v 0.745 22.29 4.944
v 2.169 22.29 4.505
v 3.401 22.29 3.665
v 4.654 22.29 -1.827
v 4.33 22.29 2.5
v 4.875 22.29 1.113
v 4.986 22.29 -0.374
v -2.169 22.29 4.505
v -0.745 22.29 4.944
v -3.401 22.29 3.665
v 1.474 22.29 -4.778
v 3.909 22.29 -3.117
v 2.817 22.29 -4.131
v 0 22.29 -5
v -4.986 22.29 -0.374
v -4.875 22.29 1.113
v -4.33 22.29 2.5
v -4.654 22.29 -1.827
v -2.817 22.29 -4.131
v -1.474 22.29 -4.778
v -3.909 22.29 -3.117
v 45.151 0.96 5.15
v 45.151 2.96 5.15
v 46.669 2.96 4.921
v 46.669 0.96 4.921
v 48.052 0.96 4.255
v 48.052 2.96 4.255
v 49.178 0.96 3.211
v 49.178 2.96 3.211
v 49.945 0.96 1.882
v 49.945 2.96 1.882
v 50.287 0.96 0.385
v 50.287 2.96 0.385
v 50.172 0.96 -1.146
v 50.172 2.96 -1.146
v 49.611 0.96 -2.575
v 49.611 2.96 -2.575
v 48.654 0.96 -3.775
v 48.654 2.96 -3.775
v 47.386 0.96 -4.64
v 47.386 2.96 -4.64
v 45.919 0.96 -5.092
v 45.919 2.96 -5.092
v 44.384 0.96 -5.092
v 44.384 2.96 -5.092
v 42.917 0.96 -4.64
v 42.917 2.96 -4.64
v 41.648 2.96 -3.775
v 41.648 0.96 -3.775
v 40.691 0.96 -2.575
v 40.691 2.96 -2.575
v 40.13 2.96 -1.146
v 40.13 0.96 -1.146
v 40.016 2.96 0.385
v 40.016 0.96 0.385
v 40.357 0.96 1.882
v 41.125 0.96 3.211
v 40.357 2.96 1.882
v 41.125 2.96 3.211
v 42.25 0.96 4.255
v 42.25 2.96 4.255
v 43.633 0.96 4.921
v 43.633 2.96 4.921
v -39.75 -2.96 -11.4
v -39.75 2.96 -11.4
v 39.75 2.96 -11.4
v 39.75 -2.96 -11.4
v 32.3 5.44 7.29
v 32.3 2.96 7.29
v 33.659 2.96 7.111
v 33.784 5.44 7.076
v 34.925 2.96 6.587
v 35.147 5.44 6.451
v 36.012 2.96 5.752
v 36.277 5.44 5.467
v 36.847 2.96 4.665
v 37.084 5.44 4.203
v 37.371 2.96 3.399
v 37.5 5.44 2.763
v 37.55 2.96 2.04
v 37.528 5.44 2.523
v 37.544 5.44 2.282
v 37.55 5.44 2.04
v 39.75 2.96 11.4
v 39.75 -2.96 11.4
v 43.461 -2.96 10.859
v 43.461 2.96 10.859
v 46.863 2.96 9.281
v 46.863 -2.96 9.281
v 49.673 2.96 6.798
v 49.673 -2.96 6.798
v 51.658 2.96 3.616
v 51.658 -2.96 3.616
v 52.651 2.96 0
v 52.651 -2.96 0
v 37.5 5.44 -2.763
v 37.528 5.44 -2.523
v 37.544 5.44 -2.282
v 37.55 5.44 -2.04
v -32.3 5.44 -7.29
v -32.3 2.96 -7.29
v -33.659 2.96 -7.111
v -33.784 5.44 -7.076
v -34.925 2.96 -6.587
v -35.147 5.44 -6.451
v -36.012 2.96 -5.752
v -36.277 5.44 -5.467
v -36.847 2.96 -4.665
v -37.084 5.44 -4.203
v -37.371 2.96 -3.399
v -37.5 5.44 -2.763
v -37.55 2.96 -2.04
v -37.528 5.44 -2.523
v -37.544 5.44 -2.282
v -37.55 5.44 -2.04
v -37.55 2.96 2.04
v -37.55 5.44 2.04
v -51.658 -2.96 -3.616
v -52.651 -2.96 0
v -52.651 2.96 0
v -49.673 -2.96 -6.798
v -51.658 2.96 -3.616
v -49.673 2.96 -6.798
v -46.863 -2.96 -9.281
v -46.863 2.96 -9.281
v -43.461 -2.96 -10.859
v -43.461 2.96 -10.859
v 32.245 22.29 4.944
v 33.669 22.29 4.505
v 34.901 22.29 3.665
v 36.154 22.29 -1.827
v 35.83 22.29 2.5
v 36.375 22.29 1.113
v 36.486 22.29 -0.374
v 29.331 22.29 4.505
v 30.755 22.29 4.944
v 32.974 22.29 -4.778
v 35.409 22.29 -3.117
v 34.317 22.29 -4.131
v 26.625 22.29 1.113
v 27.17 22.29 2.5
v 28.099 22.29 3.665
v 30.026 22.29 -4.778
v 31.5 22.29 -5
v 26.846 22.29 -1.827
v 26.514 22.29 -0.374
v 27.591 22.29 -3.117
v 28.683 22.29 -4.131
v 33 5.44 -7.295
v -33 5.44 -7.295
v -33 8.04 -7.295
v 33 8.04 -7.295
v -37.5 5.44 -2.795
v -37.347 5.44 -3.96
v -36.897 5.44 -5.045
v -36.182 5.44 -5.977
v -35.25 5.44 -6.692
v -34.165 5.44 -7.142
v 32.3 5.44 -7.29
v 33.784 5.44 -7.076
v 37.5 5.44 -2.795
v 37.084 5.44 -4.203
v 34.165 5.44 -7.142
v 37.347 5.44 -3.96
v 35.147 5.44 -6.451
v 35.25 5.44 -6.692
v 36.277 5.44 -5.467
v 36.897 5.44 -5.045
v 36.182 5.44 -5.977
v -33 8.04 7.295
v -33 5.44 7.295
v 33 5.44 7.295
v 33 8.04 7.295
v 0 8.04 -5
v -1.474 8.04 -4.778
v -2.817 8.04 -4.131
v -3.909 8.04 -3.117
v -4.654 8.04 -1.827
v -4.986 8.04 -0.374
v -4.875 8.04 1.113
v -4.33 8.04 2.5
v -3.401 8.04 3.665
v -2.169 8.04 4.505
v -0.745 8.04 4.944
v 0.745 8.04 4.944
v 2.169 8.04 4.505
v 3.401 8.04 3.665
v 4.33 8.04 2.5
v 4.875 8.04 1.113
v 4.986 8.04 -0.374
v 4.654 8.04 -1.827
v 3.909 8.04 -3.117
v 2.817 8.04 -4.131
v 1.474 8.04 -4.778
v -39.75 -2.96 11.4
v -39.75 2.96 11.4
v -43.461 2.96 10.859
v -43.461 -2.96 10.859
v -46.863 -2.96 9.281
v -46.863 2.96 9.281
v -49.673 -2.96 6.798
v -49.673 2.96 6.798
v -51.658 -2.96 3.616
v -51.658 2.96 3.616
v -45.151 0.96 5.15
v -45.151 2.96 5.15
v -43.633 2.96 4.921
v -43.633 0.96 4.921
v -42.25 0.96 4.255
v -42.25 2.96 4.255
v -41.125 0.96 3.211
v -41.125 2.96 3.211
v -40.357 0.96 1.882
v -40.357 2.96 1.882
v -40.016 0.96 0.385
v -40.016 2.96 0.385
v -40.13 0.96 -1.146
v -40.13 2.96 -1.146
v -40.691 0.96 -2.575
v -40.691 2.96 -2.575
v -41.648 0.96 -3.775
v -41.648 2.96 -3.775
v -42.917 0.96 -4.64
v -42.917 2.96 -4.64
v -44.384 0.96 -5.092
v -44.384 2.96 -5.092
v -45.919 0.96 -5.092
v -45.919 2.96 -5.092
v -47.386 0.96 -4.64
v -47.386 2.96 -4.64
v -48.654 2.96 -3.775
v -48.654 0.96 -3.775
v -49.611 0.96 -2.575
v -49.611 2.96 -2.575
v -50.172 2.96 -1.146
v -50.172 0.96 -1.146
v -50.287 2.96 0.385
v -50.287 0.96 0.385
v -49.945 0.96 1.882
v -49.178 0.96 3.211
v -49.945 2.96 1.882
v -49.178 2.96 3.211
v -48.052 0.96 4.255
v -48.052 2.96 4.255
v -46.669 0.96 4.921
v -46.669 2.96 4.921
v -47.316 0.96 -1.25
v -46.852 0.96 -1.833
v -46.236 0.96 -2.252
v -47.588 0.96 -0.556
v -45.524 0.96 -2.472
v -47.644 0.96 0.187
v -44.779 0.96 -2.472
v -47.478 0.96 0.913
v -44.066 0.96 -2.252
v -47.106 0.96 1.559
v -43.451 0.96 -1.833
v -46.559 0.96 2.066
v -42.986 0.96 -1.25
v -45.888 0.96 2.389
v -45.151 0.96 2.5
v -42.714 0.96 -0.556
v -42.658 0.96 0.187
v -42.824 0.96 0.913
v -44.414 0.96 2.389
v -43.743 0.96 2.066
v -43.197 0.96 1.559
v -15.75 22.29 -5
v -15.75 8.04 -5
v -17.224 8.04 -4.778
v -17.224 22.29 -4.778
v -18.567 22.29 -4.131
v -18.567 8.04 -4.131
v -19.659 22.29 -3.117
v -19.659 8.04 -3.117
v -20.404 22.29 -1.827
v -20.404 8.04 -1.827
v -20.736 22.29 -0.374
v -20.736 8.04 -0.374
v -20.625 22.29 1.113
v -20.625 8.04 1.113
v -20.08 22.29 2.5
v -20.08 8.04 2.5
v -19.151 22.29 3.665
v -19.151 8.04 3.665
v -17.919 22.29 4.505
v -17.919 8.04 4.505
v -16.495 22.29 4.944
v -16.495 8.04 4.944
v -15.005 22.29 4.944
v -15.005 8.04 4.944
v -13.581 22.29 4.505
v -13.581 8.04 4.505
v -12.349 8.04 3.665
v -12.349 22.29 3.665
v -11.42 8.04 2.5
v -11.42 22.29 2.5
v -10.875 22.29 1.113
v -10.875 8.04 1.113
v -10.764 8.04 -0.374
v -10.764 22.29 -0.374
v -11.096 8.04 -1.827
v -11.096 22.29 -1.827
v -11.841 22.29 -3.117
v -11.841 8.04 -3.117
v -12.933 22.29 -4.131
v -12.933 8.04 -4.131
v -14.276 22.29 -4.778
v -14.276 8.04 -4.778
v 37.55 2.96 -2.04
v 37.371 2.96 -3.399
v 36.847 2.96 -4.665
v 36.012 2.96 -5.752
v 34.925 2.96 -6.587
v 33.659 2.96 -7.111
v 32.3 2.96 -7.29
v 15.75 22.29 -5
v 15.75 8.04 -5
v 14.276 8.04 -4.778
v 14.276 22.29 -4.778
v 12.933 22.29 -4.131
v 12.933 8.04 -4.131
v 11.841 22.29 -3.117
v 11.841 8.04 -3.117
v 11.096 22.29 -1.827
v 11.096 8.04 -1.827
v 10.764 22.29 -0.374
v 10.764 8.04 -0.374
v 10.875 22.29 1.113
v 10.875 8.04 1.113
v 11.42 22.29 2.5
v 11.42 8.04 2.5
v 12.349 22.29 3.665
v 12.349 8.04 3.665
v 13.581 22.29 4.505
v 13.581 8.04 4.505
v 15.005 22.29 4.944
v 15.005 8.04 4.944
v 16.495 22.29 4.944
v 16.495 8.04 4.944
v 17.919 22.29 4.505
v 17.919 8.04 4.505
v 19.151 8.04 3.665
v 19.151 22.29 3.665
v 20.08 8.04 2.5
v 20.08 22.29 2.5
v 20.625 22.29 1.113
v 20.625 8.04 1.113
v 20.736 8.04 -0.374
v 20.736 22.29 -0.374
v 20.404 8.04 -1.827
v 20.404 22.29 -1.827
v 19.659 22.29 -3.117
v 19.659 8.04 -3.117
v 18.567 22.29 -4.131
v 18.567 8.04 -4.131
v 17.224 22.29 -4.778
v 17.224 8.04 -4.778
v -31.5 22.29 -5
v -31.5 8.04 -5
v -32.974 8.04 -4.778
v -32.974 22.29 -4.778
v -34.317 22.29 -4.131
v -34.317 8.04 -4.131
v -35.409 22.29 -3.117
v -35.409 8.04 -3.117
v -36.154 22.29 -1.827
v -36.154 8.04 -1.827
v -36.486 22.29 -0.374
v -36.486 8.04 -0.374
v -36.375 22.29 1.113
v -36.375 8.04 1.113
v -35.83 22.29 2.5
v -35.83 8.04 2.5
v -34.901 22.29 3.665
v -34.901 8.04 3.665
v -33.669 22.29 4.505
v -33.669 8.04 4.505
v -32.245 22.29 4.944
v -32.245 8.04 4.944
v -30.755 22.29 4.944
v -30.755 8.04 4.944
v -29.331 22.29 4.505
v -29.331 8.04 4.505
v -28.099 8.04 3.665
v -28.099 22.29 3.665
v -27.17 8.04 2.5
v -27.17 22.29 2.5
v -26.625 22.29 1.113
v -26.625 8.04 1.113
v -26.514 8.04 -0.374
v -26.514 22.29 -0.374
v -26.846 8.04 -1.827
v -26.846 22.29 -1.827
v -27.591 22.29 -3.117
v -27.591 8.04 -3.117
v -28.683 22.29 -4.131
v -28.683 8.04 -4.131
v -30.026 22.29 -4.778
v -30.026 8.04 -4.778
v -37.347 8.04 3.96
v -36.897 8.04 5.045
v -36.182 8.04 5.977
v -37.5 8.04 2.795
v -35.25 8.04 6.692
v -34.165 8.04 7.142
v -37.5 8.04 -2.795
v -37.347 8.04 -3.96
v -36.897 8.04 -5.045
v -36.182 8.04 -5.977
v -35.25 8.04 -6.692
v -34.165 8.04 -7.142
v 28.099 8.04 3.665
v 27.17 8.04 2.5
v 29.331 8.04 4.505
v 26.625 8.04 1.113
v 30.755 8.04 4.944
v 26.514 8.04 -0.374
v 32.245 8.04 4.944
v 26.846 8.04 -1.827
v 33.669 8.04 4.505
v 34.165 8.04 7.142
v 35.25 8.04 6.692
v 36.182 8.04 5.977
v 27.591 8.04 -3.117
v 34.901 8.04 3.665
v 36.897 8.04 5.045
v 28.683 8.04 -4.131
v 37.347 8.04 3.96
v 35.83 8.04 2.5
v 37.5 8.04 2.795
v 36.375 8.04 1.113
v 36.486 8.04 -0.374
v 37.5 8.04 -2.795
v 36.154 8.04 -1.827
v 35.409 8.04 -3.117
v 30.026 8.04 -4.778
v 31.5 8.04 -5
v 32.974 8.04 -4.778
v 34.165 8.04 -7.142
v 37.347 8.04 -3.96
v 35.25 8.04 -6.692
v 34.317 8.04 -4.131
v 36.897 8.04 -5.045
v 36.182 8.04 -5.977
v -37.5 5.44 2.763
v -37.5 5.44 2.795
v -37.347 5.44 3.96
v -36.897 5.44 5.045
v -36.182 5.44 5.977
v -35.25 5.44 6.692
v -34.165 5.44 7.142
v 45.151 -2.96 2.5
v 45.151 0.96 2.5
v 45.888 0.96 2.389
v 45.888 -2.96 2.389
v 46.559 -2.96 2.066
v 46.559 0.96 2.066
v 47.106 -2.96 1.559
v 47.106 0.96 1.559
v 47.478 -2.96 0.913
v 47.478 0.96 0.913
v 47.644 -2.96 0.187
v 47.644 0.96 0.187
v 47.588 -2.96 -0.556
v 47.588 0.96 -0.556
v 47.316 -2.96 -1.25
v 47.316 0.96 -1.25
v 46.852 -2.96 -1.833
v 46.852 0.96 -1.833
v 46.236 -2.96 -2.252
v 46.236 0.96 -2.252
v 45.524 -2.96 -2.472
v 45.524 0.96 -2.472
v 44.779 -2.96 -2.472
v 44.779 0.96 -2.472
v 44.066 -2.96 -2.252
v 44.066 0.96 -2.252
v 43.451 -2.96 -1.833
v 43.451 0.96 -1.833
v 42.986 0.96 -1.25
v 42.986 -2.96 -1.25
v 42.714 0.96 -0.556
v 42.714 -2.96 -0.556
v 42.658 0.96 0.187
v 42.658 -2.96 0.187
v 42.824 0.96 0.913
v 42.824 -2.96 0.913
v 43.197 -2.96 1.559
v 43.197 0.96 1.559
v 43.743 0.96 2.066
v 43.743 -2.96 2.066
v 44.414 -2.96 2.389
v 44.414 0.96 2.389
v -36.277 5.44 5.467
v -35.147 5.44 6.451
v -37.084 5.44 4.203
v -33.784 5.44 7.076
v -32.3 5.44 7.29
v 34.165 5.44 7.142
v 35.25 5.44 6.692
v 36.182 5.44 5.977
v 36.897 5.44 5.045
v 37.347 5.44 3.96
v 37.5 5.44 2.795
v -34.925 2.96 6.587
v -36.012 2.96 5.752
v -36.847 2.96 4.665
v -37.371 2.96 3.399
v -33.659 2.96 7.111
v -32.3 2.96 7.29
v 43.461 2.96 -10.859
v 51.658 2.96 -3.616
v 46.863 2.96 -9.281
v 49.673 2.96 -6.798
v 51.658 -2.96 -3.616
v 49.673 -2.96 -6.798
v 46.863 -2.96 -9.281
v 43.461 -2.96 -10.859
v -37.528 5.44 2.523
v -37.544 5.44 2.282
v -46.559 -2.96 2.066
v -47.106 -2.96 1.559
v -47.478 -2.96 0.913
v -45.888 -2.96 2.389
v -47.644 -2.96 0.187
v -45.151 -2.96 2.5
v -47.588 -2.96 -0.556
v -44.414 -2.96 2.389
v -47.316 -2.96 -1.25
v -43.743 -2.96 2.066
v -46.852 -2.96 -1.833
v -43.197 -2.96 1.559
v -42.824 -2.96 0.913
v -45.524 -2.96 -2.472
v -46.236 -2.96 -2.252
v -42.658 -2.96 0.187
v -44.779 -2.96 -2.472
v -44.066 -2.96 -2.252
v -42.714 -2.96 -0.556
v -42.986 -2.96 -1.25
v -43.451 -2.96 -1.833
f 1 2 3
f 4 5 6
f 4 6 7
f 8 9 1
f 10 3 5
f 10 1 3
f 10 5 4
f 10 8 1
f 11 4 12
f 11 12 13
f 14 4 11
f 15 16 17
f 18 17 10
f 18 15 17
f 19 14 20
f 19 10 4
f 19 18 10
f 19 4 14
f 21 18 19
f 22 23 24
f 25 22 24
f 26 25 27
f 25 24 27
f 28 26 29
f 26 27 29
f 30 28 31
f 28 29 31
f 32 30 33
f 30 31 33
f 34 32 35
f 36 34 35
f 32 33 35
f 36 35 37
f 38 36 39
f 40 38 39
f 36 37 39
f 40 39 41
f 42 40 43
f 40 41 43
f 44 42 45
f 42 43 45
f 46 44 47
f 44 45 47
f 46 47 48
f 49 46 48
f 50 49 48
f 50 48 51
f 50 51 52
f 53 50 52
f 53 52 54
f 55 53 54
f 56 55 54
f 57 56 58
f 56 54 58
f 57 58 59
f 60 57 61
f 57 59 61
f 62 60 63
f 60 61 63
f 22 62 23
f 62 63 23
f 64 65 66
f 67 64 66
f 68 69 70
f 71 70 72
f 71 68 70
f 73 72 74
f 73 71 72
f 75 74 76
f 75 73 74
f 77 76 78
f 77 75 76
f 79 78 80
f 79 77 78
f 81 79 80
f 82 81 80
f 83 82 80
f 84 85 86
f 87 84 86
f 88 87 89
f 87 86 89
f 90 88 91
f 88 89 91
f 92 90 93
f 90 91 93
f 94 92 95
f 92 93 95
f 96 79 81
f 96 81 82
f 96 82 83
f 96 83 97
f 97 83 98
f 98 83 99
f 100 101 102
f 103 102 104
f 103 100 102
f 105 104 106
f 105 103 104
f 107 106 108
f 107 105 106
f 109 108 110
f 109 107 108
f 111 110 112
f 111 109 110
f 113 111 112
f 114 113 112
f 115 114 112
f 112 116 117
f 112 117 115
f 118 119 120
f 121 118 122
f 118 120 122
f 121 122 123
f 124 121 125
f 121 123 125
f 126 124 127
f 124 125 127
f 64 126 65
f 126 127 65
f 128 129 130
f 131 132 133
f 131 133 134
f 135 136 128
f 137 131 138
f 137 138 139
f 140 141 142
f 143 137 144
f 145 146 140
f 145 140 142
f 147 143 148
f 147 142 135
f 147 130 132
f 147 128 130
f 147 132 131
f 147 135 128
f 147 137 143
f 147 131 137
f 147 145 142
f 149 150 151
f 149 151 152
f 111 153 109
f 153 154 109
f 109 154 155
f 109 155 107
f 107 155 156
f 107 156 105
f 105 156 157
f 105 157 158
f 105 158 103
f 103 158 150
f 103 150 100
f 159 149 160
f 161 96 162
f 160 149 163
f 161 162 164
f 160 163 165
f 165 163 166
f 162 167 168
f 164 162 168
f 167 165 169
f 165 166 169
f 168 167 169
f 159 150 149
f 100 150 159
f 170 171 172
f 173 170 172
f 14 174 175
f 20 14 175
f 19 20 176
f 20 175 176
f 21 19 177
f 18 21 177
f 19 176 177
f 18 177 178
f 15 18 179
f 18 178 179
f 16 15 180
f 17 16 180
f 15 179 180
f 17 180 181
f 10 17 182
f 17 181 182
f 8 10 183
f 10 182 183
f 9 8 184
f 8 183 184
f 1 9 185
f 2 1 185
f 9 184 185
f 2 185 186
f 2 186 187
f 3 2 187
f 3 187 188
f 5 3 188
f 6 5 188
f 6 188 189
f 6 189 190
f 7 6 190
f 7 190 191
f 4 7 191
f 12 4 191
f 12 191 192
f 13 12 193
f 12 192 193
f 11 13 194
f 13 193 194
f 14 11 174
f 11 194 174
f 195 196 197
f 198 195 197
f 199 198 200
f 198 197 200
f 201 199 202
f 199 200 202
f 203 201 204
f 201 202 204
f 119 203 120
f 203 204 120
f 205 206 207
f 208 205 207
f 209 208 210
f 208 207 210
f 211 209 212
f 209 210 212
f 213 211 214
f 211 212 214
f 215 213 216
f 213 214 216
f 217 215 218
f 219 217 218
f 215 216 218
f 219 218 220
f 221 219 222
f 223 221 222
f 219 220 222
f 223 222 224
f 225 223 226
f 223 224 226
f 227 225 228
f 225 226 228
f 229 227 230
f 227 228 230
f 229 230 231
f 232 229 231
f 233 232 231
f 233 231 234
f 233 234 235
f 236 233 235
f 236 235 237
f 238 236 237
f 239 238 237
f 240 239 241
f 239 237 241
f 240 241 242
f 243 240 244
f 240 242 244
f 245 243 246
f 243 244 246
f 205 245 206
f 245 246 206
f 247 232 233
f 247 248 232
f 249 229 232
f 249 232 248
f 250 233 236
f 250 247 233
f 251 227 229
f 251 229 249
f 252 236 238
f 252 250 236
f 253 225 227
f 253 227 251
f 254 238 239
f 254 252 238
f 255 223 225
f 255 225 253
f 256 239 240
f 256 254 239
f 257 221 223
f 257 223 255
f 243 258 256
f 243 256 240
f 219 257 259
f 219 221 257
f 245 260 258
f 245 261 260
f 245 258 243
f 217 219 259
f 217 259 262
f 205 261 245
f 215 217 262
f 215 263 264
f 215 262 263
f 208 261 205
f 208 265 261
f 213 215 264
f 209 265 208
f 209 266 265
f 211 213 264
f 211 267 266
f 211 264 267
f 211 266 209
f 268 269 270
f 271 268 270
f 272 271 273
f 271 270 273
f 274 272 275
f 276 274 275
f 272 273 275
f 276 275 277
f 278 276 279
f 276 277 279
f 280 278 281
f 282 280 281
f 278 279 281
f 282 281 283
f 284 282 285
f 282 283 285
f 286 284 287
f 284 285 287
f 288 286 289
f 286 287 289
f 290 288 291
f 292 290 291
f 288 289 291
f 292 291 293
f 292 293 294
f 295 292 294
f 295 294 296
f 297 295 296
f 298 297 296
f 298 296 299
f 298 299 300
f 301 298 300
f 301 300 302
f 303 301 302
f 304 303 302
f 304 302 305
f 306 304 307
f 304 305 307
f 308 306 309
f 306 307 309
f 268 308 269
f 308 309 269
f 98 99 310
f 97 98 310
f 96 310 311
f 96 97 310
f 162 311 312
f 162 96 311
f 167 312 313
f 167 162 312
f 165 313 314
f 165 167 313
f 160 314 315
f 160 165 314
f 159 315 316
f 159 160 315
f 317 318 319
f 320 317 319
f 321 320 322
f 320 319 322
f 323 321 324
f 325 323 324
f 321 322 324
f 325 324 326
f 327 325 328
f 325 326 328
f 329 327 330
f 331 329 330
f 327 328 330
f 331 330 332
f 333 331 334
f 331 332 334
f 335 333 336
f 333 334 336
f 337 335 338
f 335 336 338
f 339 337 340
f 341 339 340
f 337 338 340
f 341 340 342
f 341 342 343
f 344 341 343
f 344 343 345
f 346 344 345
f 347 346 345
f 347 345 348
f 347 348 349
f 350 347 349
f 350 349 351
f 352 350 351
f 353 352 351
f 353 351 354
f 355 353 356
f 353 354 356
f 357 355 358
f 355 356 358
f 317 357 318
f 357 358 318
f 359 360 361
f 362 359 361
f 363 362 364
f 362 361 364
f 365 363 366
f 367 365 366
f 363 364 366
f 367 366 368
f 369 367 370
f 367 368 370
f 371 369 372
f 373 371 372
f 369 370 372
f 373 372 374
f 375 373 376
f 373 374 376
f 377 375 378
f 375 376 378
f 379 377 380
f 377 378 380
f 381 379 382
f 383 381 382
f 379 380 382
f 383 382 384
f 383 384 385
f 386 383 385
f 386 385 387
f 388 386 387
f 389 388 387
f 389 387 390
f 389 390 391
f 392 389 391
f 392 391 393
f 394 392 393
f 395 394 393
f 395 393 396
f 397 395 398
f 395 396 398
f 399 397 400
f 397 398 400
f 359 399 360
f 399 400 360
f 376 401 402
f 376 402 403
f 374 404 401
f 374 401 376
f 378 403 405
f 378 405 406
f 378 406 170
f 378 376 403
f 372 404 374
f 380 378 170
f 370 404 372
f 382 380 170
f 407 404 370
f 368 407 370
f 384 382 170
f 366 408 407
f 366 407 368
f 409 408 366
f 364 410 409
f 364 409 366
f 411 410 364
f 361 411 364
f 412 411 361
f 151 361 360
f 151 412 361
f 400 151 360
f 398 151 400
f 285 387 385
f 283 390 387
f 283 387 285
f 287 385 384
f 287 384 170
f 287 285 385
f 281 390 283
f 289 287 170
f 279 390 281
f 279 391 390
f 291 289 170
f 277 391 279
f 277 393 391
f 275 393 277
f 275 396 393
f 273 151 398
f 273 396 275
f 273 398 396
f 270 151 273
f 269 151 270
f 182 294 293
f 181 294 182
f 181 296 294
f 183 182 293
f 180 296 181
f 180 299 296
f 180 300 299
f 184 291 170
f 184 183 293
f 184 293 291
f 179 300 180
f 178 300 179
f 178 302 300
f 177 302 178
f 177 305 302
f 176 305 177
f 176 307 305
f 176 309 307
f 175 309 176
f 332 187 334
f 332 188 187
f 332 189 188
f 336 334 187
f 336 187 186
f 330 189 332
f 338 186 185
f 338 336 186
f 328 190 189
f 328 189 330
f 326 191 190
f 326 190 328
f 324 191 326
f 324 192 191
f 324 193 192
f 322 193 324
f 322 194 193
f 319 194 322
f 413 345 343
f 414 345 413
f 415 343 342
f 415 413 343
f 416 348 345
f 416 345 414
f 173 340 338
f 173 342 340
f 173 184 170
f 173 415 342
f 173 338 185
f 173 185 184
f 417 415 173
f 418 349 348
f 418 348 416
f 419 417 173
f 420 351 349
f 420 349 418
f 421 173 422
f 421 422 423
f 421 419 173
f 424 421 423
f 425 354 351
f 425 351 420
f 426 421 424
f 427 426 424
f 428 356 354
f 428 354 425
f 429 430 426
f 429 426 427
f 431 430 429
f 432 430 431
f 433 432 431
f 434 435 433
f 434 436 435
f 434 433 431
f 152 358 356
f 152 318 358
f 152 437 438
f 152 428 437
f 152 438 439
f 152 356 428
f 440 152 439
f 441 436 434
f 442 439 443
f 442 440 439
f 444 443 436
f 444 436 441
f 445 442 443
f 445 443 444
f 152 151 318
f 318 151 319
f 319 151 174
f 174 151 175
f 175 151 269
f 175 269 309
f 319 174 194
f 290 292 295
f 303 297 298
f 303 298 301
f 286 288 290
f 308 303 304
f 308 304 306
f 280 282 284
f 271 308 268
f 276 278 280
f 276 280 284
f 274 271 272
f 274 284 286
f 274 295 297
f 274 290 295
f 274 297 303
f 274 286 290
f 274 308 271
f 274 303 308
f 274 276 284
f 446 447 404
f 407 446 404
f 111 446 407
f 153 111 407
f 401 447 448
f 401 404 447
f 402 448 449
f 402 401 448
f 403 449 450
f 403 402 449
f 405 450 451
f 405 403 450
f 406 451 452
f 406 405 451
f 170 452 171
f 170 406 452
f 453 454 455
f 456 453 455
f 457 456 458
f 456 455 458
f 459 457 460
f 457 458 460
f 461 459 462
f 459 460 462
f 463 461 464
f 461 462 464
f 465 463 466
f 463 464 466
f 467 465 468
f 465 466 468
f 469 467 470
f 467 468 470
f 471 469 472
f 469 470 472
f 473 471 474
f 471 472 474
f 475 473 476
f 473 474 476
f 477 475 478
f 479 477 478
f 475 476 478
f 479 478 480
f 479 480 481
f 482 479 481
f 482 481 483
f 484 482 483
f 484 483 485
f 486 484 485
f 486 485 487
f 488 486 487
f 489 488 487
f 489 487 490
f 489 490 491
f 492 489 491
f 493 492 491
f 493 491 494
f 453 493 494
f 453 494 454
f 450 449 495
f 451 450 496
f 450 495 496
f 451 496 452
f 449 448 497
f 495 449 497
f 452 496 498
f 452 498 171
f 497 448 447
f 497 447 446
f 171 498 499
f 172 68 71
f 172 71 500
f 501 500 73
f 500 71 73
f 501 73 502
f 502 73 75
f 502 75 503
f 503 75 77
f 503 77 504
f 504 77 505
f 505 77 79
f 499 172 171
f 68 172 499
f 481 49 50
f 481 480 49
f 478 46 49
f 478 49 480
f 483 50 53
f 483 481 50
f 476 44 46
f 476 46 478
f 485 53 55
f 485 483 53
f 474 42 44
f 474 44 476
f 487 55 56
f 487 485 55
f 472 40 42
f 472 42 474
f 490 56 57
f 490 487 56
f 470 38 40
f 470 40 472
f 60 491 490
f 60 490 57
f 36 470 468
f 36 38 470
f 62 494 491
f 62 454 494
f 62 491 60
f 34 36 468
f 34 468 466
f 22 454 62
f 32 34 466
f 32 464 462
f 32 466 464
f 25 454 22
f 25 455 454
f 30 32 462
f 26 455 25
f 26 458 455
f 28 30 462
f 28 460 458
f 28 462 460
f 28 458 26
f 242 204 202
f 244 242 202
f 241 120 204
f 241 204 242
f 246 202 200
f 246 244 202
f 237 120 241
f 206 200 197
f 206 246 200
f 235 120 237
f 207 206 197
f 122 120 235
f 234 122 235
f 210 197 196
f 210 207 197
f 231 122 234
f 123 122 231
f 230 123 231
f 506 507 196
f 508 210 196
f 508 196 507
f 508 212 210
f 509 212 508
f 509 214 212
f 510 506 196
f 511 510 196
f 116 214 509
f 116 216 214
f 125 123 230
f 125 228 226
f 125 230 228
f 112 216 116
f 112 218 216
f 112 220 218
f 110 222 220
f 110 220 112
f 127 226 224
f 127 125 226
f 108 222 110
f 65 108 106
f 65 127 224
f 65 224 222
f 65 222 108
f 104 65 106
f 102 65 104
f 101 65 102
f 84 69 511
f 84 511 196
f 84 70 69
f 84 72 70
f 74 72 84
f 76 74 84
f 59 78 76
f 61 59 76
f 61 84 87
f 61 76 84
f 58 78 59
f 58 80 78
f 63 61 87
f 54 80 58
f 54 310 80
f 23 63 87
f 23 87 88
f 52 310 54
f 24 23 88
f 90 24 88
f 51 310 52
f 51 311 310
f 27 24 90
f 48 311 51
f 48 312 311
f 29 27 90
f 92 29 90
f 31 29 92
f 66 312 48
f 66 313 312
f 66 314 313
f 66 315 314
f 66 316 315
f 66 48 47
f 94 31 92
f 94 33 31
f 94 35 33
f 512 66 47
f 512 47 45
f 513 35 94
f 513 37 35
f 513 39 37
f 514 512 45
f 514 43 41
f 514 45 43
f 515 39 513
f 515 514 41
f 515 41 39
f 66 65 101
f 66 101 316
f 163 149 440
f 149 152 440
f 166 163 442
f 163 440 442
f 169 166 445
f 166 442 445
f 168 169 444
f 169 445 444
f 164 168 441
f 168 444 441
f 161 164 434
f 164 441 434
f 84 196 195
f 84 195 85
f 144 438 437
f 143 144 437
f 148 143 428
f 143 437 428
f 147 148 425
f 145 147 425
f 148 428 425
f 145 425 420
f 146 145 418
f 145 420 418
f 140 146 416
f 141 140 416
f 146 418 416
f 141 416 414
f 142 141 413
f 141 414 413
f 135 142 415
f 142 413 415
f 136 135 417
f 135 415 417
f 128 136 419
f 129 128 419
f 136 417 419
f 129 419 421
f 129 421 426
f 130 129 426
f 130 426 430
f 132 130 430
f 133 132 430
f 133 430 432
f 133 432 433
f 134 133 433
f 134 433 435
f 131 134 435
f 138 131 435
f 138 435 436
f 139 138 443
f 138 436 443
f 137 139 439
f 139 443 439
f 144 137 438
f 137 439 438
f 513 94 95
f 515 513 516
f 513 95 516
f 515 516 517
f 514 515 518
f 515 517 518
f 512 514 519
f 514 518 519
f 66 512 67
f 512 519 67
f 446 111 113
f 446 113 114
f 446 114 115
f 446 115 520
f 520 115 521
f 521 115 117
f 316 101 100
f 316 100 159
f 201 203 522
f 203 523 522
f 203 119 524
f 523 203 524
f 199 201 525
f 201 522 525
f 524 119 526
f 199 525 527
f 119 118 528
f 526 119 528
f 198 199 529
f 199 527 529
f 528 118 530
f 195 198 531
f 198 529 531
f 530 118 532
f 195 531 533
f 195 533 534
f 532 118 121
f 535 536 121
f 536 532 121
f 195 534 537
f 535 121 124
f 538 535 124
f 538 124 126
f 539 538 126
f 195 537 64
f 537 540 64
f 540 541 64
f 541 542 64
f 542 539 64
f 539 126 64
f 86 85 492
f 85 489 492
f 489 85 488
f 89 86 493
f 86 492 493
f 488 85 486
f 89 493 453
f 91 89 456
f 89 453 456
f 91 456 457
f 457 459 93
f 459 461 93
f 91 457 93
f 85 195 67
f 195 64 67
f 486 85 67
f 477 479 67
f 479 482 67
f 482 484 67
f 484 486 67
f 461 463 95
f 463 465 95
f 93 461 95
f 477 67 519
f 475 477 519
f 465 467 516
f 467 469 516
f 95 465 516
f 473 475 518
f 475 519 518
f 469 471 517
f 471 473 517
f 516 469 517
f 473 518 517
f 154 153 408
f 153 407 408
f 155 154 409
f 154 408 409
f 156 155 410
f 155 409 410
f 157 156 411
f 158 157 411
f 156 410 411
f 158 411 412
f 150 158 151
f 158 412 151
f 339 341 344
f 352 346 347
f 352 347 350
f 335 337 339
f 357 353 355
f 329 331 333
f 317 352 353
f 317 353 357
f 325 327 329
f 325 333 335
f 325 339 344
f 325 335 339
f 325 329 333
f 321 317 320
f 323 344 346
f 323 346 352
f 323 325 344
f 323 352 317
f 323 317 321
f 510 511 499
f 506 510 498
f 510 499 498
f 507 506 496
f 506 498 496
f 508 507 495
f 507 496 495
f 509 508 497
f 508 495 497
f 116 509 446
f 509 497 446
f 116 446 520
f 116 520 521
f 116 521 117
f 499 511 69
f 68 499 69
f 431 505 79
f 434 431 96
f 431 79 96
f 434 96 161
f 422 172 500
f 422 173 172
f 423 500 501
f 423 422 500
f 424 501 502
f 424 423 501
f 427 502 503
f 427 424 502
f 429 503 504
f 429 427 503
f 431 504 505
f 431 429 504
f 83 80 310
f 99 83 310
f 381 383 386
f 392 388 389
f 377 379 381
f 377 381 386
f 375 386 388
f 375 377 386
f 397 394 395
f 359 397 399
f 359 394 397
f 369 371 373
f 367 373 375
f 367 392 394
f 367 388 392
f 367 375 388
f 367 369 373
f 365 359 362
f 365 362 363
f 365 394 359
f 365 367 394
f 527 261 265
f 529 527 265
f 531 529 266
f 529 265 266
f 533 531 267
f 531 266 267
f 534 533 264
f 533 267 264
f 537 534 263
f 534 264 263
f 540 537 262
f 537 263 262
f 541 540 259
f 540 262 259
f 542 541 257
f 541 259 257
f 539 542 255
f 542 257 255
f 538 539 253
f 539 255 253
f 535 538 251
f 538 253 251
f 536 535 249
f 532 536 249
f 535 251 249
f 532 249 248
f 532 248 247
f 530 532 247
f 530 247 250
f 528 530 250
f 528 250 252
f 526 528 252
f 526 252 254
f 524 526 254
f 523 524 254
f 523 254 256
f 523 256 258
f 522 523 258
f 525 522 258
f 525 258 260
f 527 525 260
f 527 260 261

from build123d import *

# Parameters (mm, degrees)
SKETCH1_W           = 105.5
SKETCH1_H           = 22.8
BOSS_EXTRUDE1_DEPTH = 2.96
FILLET1_R           = 13
SKETCH2_R           = 2.5
CUT_EXTRUDE1_DEPTH  = 5.92
SKETCH3_R           = 5.15
CUT_EXTRUDE2_DEPTH  = 2
SKETCH4_W           = 75.1
SKETCH4_H           = 14.58
BOSS_EXTRUDE3_DEPTH = 2.48
FILLET2_R           = 5.25
SKETCH6_W           = 75
SKETCH6_H           = 14.59
BOSS_EXTRUDE4_DEPTH = 2.6
FILLET4_R           = 4.5
SKETCH7_R           = 5
BOSS_EXTRUDE5_DEPTH = 14.25


with BuildPart() as part:
    # Sketch1 → Boss-Extrude1 (new, symmetric)
    with BuildSketch(Plane(origin=(0, 0, 0), x_dir=(1, 0, 0), z_dir=(0, 1, 0))):
        Rectangle(SKETCH1_W, SKETCH1_H)
    extrude(amount=BOSS_EXTRUDE1_DEPTH, both=True)

    # Fillet1
    # the kernel refuses this fillet: 13 mm, written as the material it takes off along each edge
    with BuildSketch(Plane(origin=(-52.75, 35.46, -11.4), x_dir=(1, 0, 0), z_dir=(0, -1, 0)), Plane(origin=(52.75, -35.46, -11.4), x_dir=(-1, 0, 0), z_dir=(0, 1, 0))) as fillet1_piece_1:
        with BuildLine():
            CenterArc((FILLET1_R, FILLET1_R), FILLET1_R, 180, 90)
            Line((0, FILLET1_R), (0, 0))
            Line((0, 0), (FILLET1_R, 0))
        make_face()
    extrude(amount=70.92, mode=Mode.SUBTRACT)
    with BuildSketch(Plane(origin=(-52.75, 35.46, 11.4), x_dir=(1, 0, 0), z_dir=(0, -1, 0)), Plane(origin=(52.75, -35.46, 11.4), x_dir=(-1, 0, 0), z_dir=(0, 1, 0))) as fillet1_piece_2:
        with BuildLine():
            CenterArc((FILLET1_R, -FILLET1_R), FILLET1_R, 90, 90)
            Line((0, -FILLET1_R), (0, 0))
            Line((0, 0), (FILLET1_R, 0))
        make_face()
    extrude(amount=70.92, mode=Mode.SUBTRACT)

    # Sketch2 → Cut-Extrude1 (cut)
    with BuildSketch(Plane(origin=(0, 2.96, 0), x_dir=(1, 0, 0), z_dir=(0, 1, 0))):
        with Locations(Location((-45.151162738, 0, 0), (0, 0, 270))):
            Circle(SKETCH2_R)
        with Locations(Location((45.151162738, 0, 0), (0, 0, 270))):
            Circle(SKETCH2_R)
    extrude(amount=-CUT_EXTRUDE1_DEPTH, mode=Mode.SUBTRACT)

    # Sketch3 → Cut-Extrude2 (cut)
    with BuildSketch(Plane(origin=(0, 2.96, 0), x_dir=(1, 0, 0), z_dir=(0, 1, 0))):
        with Locations(Location((-45.151162738, 0, 0), (0, 0, 270))):
            Circle(SKETCH3_R)
        with Locations(Location((45.151162738, 0, 0), (0, 0, 270))):
            Circle(SKETCH3_R)
    extrude(amount=-CUT_EXTRUDE2_DEPTH, mode=Mode.SUBTRACT)

    # Sketch4 → Boss-Extrude3 (add)
    with BuildSketch(Plane(origin=(0, 2.96, 0), x_dir=(1, 0, 0), z_dir=(0, 1, 0))):
        Rectangle(SKETCH4_W, SKETCH4_H)
    extrude(amount=BOSS_EXTRUDE3_DEPTH)

    # Fillet2
    fillet2_edges = [part.edges().sort_by_distance(p)[0] for p in [
        (-37.55, 4.2, -7.29),
        (-37.55, 4.2, 7.29),
        (37.55, 4.2, 7.29),
        (37.55, 4.2, -7.29),
    ]]
    fillet(fillet2_edges, radius=FILLET2_R)

    # Sketch6 → Boss-Extrude4 (add)
    with BuildSketch(Plane(origin=(0, 5.44, 0), x_dir=(1, 0, 0), z_dir=(0, 1, 0))):
        Rectangle(SKETCH6_W, SKETCH6_H)
    extrude(amount=BOSS_EXTRUDE4_DEPTH)

    # Fillet4
    fillet4_edges = [part.edges().sort_by_distance(p)[0] for p in [
        (-37.5, 6.74, -7.295),
        (-37.5, 6.74, 7.295),
        (37.5, 6.74, 7.295),
        (37.5, 6.74, -7.295),
    ]]
    fillet(fillet4_edges, radius=FILLET4_R)

    # Sketch7 → Boss-Extrude5 (add)
    with BuildSketch(Plane(origin=(0, 8.04, 0), x_dir=(1, 0, 0), z_dir=(0, 1, 0))):
        with Locations(Location((-31.5, 0, 0), (0, 0, 90))):
            Circle(SKETCH7_R)
        with Locations(Location((-15.75, 0, 0), (0, 0, 90))):
            Circle(SKETCH7_R)
        with Locations(Location((0, 0, 0), (0, 0, 90))):
            Circle(SKETCH7_R)
        with Locations(Location((15.75, 0, 0), (0, 0, 90))):
            Circle(SKETCH7_R)
        with Locations(Location((31.5, 0, 0), (0, 0, 90))):
            Circle(SKETCH7_R)
    extrude(amount=BOSS_EXTRUDE5_DEPTH)


solid = part.part
